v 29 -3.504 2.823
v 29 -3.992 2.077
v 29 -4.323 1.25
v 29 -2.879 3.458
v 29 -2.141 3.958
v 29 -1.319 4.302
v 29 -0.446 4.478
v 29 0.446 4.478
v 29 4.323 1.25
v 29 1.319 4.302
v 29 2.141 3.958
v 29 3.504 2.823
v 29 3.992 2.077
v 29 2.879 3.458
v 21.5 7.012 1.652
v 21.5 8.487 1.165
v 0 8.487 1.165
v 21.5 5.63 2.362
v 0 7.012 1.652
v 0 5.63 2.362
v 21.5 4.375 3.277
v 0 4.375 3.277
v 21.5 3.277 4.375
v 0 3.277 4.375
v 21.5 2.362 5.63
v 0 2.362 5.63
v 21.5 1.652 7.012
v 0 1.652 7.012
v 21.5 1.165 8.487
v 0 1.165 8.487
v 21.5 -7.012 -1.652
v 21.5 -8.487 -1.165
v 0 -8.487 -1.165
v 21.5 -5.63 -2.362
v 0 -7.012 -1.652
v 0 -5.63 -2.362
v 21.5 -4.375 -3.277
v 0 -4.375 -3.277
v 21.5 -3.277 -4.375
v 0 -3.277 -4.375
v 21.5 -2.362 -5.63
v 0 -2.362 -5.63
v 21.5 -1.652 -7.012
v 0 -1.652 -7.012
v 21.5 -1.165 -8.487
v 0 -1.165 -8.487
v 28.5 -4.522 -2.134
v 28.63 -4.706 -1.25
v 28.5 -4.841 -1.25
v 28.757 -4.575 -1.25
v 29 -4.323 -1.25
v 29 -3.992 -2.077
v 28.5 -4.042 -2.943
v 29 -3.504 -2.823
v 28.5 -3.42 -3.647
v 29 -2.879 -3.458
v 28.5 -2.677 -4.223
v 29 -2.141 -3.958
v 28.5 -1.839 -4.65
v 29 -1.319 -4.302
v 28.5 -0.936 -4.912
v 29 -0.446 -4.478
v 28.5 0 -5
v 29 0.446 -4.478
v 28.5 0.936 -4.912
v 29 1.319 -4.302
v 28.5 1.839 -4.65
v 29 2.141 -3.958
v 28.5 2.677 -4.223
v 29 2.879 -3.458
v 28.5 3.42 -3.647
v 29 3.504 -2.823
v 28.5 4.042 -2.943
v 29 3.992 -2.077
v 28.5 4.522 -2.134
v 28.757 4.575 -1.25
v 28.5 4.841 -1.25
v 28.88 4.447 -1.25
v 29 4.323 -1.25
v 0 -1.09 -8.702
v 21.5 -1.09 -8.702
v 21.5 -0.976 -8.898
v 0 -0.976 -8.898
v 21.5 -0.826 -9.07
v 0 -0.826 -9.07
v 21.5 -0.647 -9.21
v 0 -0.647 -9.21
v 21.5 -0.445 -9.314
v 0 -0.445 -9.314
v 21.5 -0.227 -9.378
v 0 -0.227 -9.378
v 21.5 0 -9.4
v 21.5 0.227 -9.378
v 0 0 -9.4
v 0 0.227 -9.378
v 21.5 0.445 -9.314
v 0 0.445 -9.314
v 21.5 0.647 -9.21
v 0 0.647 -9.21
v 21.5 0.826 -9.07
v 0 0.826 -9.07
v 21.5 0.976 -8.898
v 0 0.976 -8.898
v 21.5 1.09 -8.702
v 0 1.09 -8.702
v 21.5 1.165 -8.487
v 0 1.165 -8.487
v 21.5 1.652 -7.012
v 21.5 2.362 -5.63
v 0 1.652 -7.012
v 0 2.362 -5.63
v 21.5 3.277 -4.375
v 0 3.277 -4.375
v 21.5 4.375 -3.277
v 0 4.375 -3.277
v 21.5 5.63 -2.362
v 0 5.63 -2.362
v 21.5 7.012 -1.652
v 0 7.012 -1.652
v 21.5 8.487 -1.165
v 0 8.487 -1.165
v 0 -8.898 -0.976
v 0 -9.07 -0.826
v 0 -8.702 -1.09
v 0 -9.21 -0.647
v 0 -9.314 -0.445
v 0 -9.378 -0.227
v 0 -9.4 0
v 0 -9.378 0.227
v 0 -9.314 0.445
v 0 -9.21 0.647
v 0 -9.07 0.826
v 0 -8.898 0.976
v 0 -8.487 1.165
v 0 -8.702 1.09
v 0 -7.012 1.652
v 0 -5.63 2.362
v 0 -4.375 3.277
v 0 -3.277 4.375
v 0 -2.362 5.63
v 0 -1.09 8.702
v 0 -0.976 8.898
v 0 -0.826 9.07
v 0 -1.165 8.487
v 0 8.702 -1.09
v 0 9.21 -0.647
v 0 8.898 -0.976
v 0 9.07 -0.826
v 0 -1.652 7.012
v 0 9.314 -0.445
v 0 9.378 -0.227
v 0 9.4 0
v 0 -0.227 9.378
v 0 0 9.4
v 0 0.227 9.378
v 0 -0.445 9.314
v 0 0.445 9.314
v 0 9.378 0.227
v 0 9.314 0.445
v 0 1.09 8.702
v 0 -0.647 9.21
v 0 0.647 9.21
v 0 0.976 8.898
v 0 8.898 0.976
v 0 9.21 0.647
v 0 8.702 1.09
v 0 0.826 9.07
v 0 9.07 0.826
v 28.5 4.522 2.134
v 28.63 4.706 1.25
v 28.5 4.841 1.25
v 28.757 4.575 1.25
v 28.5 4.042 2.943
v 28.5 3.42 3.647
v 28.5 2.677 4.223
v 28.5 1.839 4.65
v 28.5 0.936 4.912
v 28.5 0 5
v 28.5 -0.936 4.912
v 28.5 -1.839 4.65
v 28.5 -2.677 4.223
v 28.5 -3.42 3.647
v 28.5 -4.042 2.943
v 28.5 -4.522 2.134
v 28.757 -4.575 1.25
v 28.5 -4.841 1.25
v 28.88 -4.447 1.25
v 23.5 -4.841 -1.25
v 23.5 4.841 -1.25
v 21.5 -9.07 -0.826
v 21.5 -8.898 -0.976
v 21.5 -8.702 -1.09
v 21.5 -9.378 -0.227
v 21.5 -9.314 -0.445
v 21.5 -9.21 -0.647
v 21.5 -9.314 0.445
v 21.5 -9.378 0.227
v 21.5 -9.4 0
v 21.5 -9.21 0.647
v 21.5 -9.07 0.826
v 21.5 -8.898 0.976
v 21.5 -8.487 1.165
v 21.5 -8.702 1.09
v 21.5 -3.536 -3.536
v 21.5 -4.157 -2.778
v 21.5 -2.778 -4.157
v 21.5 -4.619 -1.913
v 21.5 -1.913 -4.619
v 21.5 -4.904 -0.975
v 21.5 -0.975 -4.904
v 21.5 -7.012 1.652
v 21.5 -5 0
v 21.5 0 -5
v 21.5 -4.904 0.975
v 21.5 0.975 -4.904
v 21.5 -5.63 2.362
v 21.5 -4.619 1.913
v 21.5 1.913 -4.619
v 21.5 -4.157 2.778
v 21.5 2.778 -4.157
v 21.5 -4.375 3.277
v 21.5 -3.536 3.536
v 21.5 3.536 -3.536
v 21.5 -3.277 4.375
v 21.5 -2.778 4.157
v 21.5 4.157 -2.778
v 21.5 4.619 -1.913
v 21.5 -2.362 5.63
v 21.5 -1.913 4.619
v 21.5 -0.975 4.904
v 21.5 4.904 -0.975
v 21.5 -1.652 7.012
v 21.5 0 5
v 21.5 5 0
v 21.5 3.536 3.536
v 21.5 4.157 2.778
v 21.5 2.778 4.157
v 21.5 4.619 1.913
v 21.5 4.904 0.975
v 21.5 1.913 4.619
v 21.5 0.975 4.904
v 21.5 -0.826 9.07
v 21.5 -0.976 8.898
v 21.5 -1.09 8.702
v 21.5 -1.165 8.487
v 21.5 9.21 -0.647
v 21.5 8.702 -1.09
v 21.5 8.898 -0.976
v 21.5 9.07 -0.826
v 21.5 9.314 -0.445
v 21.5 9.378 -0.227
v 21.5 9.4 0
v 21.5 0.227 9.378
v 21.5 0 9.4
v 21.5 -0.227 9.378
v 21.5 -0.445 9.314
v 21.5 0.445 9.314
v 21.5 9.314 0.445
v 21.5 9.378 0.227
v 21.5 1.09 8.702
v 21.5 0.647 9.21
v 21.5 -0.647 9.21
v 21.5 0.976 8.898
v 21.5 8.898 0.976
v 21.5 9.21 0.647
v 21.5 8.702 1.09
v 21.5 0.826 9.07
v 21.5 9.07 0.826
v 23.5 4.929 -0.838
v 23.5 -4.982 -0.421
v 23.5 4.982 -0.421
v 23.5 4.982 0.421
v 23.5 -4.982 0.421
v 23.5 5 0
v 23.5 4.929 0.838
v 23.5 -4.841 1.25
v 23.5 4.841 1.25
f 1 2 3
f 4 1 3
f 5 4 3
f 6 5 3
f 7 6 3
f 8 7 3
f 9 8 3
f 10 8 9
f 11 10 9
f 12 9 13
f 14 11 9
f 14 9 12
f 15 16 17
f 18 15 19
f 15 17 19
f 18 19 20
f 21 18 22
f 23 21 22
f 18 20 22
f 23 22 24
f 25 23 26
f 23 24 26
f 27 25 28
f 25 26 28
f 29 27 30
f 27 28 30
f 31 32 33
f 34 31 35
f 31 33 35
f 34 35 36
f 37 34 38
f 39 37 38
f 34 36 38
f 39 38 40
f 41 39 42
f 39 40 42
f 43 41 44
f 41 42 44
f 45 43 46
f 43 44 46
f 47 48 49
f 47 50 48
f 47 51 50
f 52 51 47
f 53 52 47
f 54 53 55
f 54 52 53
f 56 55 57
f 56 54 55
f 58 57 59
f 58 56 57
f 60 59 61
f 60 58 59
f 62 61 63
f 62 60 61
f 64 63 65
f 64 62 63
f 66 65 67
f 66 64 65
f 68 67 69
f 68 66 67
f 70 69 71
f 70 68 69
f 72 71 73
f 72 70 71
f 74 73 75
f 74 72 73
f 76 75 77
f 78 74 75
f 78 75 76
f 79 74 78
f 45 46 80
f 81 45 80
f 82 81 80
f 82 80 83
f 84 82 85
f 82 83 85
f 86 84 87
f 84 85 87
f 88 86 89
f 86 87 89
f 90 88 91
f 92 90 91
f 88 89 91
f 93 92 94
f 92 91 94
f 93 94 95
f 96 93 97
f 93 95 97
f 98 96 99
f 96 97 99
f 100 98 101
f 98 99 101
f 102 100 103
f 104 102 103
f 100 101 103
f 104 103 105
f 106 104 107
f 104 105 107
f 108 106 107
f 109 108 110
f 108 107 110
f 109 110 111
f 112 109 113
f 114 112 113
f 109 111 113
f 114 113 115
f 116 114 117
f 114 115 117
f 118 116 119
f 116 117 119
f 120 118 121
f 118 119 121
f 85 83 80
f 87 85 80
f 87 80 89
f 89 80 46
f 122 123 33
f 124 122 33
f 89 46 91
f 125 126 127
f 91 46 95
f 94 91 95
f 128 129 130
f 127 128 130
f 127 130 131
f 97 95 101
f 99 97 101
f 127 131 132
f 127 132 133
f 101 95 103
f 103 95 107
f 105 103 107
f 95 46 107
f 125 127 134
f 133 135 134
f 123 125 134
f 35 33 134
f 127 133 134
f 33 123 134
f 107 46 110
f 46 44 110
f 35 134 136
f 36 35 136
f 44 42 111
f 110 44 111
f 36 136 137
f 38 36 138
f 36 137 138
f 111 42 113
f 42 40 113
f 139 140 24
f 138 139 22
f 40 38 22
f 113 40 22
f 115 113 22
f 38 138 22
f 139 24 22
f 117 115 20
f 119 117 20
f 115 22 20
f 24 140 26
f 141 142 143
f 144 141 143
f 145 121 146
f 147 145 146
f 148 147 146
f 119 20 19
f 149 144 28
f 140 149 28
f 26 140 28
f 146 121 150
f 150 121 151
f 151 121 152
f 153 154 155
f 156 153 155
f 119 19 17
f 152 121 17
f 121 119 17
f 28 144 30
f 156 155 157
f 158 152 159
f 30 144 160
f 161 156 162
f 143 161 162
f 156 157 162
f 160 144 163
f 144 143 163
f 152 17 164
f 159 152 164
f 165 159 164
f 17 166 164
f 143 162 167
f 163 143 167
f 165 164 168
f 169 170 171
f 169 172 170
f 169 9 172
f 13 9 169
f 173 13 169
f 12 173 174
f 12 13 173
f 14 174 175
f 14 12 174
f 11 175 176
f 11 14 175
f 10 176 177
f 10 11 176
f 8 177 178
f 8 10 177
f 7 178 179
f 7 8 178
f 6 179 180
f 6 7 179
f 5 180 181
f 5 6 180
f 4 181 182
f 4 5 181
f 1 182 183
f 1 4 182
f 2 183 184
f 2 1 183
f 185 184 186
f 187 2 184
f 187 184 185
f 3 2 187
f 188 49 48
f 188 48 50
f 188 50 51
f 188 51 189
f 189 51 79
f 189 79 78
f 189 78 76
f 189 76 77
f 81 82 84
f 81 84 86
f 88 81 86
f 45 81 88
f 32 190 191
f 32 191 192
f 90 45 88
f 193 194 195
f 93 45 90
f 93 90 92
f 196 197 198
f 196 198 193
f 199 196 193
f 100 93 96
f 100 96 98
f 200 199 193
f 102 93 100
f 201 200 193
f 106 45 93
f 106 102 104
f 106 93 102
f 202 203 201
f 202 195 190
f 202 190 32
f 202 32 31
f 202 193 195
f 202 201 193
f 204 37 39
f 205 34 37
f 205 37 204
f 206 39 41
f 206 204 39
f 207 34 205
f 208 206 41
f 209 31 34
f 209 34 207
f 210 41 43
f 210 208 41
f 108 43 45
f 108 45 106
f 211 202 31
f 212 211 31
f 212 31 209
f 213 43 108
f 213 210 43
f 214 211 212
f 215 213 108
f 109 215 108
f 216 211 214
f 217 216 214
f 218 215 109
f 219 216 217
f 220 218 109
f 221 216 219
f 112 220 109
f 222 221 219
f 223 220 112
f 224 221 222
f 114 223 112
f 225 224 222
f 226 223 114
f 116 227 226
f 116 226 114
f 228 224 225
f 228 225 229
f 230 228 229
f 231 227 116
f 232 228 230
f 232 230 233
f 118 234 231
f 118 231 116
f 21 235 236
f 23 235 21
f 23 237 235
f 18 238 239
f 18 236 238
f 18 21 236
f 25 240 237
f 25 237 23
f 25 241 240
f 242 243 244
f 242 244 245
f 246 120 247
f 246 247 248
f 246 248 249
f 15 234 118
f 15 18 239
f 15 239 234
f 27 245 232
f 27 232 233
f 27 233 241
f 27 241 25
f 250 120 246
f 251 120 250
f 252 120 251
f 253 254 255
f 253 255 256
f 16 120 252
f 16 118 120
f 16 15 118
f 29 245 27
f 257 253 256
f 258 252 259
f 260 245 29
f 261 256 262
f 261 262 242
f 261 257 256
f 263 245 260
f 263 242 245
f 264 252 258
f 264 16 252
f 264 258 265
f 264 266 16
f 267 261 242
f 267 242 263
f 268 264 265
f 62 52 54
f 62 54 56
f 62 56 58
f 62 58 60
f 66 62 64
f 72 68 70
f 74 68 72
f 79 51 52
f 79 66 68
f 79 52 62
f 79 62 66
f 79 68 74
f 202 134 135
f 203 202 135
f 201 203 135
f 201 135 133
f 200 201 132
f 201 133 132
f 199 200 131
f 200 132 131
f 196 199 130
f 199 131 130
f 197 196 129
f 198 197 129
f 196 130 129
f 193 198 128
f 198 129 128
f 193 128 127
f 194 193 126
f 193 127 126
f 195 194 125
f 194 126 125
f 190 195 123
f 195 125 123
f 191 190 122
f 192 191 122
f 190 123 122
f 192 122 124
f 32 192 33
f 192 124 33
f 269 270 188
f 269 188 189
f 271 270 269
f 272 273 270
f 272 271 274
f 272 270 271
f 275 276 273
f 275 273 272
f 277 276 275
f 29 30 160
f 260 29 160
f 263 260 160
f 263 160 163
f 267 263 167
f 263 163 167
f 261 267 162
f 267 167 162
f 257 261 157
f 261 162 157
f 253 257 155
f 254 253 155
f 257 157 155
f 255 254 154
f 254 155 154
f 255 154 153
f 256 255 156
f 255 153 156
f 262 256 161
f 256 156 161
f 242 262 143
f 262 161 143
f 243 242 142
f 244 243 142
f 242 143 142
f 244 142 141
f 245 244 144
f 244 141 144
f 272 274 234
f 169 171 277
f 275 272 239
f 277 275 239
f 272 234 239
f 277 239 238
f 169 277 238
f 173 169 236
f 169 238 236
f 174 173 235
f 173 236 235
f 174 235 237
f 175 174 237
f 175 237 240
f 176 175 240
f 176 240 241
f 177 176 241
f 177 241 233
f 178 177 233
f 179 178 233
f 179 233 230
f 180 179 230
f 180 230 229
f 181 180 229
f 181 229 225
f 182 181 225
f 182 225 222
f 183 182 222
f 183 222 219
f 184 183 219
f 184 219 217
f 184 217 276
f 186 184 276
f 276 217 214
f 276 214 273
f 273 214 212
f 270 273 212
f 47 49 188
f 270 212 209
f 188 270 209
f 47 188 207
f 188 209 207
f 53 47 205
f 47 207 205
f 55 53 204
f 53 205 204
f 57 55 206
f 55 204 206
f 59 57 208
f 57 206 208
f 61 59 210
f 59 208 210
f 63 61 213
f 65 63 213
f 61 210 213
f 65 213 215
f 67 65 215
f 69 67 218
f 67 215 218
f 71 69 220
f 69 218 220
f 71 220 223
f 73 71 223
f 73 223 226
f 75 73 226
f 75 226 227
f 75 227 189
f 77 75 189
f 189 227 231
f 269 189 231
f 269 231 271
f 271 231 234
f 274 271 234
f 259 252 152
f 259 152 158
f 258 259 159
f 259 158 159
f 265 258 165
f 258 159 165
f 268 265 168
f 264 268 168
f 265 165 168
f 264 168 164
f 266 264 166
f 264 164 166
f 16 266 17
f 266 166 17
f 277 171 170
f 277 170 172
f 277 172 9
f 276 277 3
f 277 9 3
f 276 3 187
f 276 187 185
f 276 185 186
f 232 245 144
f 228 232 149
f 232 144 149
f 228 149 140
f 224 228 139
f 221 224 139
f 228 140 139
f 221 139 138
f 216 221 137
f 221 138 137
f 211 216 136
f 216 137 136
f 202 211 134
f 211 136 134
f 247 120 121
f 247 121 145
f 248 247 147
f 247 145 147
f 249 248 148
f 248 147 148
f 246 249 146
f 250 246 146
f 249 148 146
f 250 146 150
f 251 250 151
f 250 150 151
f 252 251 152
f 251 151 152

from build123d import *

# Parameters (mm, degrees)
F1_DEPTH = 21.5
F2_R     = 5
F3_DEPTH = 7.5
F4_SIZE  = 0.5
F6_DEPTH = 5.5


with BuildPart() as f1:
    # F0 (on Right) → F1 (new body)
    with BuildSketch(Plane.YZ):
        with BuildLine():
            ThreePointArc((-1.1652526978, 8.4866812693), (-0.1443896855, 7.0087184973), (1.2, 8.2))
            ThreePointArc((1.2, 8.2), (1.1912815027, 8.3443896855), (1.1652526978, 8.4866812693))
            ThreePointArc((1.1652526978, 8.4866812693), (0, 9.4), (-1.1652526978, 8.4866812693))
        make_face()
        with BuildLine():
            ThreePointArc((1.1652526978, 8.4866812693), (1.1912815027, 8.3443896855), (1.2, 8.2))
            ThreePointArc((1.2, 8.2), (-0.1443896855, 7.0087184973), (-1.1652526978, 8.4866812693))
            ThreePointArc((-1.1652526978, 8.4866812693), (-3.8046240347, 3.8046240347), (-8.4866812693, 1.1652526978))
            ThreePointArc((-8.4866812693, 1.1652526978), (-7.4597356969, 0.9444621547), (-7, 0))
            ThreePointArc((-7, 0), (-7.4597356969, -0.9444621547), (-8.4866812693, -1.1652526978))
            ThreePointArc((-8.4866812693, -1.1652526978), (-3.8046240347, -3.8046240347), (-1.1652526978, -8.4866812693))
            ThreePointArc((-1.1652526978, -8.4866812693), (-0.1443896855, -7.0087184973), (1.2, -8.2))
            ThreePointArc((1.2, -8.2), (1.1912815027, -8.3443896855), (1.1652526978, -8.4866812693))
            ThreePointArc((1.1652526978, -8.4866812693), (3.8046240347, -3.8046240347), (8.4866812693, -1.1652526978))
            ThreePointArc((8.4866812693, -1.1652526978), (7, 0), (8.4866812693, 1.1652526978))
            ThreePointArc((8.4866812693, 1.1652526978), (3.8046240347, 3.8046240347), (1.1652526978, 8.4866812693))
        make_face()
        with BuildLine():
            ThreePointArc((9.4, 0), (9.1444621547, 0.7402643031), (8.4866812693, 1.1652526978))
            ThreePointArc((8.4866812693, 1.1652526978), (7, 0), (8.4866812693, -1.1652526978))
            ThreePointArc((8.4866812693, -1.1652526978), (9.1444621547, -0.7402643031), (9.4, 0))
        make_face()
        with BuildLine():
            ThreePointArc((-7, 0), (-7.4597356969, 0.9444621547), (-8.4866812693, 1.1652526978))
            ThreePointArc((-8.4866812693, 1.1652526978), (-9.4, 0), (-8.4866812693, -1.1652526978))
            ThreePointArc((-8.4866812693, -1.1652526978), (-7.4597356969, -0.9444621547), (-7, 0))
        make_face()
        with BuildLine():
            ThreePointArc((-1.1652526978, -8.4866812693), (0, -9.4), (1.1652526978, -8.4866812693))
            ThreePointArc((1.1652526978, -8.4866812693), (1.1912815027, -8.3443896855), (1.2, -8.2))
            ThreePointArc((1.2, -8.2), (-0.1443896855, -7.0087184973), (-1.1652526978, -8.4866812693))
        make_face()
    extrude(amount=F1_DEPTH)

    # F2 (on face) → F3 (join)
    with BuildSketch(Plane.YZ.offset(21.5)):
        Circle(F2_R)
    extrude(amount=F3_DEPTH)

    # F4
    f4_edges = [f1.edges().sort_by_distance(p)[0] for p in [
        (29, -5, 0),
    ]]
    chamfer(f4_edges, length=F4_SIZE)

    # F5 (on face) → F6 (cut)
    with BuildSketch(Plane.YZ.offset(29)):
        with BuildLine():
            ThreePointArc((4.5, 0), (4.4555060613, 0.6312414261), (4.3229041164, 1.25))
            Line((4.3229041164, 1.25), (-4.3229041164, 1.25))
            ThreePointArc((-4.3229041164, 1.25), (-4.5, 0), (-4.3229041164, -1.25))
            Line((-4.3229041164, -1.25), (4.3229041164, -1.25))
            ThreePointArc((4.3229041164, -1.25), (4.4555060613, -0.6312414261), (4.5, 0))
        make_face()
        with BuildLine():
            Line((-4.3229041164, 1.25), (-4.8412291828, 1.25))
            ThreePointArc((-4.8412291828, 1.25), (-5, 0), (-4.8412291828, -1.25))
            Line((-4.8412291828, -1.25), (-4.3229041164, -1.25))
            ThreePointArc((-4.3229041164, -1.25), (-4.5, 0), (-4.3229041164, 1.25))
        make_face()
        with BuildLine():
            ThreePointArc((4.8412291828, -1.25), (4.9601484813, -0.6300214624), (5, 0))
            ThreePointArc((5, 0), (4.9601484813, 0.6300214624), (4.8412291828, 1.25))
            Line((4.8412291828, 1.25), (4.3229041164, 1.25))
            ThreePointArc((4.3229041164, 1.25), (4.4555060613, 0.6312414261), (4.5, 0))
            ThreePointArc((4.5, 0), (4.4555060613, -0.6312414261), (4.3229041164, -1.25))
            Line((4.3229041164, -1.25), (4.8412291828, -1.25))
        make_face()
    extrude(amount=-F6_DEPTH, mode=Mode.SUBTRACT)


solid = f1.part
